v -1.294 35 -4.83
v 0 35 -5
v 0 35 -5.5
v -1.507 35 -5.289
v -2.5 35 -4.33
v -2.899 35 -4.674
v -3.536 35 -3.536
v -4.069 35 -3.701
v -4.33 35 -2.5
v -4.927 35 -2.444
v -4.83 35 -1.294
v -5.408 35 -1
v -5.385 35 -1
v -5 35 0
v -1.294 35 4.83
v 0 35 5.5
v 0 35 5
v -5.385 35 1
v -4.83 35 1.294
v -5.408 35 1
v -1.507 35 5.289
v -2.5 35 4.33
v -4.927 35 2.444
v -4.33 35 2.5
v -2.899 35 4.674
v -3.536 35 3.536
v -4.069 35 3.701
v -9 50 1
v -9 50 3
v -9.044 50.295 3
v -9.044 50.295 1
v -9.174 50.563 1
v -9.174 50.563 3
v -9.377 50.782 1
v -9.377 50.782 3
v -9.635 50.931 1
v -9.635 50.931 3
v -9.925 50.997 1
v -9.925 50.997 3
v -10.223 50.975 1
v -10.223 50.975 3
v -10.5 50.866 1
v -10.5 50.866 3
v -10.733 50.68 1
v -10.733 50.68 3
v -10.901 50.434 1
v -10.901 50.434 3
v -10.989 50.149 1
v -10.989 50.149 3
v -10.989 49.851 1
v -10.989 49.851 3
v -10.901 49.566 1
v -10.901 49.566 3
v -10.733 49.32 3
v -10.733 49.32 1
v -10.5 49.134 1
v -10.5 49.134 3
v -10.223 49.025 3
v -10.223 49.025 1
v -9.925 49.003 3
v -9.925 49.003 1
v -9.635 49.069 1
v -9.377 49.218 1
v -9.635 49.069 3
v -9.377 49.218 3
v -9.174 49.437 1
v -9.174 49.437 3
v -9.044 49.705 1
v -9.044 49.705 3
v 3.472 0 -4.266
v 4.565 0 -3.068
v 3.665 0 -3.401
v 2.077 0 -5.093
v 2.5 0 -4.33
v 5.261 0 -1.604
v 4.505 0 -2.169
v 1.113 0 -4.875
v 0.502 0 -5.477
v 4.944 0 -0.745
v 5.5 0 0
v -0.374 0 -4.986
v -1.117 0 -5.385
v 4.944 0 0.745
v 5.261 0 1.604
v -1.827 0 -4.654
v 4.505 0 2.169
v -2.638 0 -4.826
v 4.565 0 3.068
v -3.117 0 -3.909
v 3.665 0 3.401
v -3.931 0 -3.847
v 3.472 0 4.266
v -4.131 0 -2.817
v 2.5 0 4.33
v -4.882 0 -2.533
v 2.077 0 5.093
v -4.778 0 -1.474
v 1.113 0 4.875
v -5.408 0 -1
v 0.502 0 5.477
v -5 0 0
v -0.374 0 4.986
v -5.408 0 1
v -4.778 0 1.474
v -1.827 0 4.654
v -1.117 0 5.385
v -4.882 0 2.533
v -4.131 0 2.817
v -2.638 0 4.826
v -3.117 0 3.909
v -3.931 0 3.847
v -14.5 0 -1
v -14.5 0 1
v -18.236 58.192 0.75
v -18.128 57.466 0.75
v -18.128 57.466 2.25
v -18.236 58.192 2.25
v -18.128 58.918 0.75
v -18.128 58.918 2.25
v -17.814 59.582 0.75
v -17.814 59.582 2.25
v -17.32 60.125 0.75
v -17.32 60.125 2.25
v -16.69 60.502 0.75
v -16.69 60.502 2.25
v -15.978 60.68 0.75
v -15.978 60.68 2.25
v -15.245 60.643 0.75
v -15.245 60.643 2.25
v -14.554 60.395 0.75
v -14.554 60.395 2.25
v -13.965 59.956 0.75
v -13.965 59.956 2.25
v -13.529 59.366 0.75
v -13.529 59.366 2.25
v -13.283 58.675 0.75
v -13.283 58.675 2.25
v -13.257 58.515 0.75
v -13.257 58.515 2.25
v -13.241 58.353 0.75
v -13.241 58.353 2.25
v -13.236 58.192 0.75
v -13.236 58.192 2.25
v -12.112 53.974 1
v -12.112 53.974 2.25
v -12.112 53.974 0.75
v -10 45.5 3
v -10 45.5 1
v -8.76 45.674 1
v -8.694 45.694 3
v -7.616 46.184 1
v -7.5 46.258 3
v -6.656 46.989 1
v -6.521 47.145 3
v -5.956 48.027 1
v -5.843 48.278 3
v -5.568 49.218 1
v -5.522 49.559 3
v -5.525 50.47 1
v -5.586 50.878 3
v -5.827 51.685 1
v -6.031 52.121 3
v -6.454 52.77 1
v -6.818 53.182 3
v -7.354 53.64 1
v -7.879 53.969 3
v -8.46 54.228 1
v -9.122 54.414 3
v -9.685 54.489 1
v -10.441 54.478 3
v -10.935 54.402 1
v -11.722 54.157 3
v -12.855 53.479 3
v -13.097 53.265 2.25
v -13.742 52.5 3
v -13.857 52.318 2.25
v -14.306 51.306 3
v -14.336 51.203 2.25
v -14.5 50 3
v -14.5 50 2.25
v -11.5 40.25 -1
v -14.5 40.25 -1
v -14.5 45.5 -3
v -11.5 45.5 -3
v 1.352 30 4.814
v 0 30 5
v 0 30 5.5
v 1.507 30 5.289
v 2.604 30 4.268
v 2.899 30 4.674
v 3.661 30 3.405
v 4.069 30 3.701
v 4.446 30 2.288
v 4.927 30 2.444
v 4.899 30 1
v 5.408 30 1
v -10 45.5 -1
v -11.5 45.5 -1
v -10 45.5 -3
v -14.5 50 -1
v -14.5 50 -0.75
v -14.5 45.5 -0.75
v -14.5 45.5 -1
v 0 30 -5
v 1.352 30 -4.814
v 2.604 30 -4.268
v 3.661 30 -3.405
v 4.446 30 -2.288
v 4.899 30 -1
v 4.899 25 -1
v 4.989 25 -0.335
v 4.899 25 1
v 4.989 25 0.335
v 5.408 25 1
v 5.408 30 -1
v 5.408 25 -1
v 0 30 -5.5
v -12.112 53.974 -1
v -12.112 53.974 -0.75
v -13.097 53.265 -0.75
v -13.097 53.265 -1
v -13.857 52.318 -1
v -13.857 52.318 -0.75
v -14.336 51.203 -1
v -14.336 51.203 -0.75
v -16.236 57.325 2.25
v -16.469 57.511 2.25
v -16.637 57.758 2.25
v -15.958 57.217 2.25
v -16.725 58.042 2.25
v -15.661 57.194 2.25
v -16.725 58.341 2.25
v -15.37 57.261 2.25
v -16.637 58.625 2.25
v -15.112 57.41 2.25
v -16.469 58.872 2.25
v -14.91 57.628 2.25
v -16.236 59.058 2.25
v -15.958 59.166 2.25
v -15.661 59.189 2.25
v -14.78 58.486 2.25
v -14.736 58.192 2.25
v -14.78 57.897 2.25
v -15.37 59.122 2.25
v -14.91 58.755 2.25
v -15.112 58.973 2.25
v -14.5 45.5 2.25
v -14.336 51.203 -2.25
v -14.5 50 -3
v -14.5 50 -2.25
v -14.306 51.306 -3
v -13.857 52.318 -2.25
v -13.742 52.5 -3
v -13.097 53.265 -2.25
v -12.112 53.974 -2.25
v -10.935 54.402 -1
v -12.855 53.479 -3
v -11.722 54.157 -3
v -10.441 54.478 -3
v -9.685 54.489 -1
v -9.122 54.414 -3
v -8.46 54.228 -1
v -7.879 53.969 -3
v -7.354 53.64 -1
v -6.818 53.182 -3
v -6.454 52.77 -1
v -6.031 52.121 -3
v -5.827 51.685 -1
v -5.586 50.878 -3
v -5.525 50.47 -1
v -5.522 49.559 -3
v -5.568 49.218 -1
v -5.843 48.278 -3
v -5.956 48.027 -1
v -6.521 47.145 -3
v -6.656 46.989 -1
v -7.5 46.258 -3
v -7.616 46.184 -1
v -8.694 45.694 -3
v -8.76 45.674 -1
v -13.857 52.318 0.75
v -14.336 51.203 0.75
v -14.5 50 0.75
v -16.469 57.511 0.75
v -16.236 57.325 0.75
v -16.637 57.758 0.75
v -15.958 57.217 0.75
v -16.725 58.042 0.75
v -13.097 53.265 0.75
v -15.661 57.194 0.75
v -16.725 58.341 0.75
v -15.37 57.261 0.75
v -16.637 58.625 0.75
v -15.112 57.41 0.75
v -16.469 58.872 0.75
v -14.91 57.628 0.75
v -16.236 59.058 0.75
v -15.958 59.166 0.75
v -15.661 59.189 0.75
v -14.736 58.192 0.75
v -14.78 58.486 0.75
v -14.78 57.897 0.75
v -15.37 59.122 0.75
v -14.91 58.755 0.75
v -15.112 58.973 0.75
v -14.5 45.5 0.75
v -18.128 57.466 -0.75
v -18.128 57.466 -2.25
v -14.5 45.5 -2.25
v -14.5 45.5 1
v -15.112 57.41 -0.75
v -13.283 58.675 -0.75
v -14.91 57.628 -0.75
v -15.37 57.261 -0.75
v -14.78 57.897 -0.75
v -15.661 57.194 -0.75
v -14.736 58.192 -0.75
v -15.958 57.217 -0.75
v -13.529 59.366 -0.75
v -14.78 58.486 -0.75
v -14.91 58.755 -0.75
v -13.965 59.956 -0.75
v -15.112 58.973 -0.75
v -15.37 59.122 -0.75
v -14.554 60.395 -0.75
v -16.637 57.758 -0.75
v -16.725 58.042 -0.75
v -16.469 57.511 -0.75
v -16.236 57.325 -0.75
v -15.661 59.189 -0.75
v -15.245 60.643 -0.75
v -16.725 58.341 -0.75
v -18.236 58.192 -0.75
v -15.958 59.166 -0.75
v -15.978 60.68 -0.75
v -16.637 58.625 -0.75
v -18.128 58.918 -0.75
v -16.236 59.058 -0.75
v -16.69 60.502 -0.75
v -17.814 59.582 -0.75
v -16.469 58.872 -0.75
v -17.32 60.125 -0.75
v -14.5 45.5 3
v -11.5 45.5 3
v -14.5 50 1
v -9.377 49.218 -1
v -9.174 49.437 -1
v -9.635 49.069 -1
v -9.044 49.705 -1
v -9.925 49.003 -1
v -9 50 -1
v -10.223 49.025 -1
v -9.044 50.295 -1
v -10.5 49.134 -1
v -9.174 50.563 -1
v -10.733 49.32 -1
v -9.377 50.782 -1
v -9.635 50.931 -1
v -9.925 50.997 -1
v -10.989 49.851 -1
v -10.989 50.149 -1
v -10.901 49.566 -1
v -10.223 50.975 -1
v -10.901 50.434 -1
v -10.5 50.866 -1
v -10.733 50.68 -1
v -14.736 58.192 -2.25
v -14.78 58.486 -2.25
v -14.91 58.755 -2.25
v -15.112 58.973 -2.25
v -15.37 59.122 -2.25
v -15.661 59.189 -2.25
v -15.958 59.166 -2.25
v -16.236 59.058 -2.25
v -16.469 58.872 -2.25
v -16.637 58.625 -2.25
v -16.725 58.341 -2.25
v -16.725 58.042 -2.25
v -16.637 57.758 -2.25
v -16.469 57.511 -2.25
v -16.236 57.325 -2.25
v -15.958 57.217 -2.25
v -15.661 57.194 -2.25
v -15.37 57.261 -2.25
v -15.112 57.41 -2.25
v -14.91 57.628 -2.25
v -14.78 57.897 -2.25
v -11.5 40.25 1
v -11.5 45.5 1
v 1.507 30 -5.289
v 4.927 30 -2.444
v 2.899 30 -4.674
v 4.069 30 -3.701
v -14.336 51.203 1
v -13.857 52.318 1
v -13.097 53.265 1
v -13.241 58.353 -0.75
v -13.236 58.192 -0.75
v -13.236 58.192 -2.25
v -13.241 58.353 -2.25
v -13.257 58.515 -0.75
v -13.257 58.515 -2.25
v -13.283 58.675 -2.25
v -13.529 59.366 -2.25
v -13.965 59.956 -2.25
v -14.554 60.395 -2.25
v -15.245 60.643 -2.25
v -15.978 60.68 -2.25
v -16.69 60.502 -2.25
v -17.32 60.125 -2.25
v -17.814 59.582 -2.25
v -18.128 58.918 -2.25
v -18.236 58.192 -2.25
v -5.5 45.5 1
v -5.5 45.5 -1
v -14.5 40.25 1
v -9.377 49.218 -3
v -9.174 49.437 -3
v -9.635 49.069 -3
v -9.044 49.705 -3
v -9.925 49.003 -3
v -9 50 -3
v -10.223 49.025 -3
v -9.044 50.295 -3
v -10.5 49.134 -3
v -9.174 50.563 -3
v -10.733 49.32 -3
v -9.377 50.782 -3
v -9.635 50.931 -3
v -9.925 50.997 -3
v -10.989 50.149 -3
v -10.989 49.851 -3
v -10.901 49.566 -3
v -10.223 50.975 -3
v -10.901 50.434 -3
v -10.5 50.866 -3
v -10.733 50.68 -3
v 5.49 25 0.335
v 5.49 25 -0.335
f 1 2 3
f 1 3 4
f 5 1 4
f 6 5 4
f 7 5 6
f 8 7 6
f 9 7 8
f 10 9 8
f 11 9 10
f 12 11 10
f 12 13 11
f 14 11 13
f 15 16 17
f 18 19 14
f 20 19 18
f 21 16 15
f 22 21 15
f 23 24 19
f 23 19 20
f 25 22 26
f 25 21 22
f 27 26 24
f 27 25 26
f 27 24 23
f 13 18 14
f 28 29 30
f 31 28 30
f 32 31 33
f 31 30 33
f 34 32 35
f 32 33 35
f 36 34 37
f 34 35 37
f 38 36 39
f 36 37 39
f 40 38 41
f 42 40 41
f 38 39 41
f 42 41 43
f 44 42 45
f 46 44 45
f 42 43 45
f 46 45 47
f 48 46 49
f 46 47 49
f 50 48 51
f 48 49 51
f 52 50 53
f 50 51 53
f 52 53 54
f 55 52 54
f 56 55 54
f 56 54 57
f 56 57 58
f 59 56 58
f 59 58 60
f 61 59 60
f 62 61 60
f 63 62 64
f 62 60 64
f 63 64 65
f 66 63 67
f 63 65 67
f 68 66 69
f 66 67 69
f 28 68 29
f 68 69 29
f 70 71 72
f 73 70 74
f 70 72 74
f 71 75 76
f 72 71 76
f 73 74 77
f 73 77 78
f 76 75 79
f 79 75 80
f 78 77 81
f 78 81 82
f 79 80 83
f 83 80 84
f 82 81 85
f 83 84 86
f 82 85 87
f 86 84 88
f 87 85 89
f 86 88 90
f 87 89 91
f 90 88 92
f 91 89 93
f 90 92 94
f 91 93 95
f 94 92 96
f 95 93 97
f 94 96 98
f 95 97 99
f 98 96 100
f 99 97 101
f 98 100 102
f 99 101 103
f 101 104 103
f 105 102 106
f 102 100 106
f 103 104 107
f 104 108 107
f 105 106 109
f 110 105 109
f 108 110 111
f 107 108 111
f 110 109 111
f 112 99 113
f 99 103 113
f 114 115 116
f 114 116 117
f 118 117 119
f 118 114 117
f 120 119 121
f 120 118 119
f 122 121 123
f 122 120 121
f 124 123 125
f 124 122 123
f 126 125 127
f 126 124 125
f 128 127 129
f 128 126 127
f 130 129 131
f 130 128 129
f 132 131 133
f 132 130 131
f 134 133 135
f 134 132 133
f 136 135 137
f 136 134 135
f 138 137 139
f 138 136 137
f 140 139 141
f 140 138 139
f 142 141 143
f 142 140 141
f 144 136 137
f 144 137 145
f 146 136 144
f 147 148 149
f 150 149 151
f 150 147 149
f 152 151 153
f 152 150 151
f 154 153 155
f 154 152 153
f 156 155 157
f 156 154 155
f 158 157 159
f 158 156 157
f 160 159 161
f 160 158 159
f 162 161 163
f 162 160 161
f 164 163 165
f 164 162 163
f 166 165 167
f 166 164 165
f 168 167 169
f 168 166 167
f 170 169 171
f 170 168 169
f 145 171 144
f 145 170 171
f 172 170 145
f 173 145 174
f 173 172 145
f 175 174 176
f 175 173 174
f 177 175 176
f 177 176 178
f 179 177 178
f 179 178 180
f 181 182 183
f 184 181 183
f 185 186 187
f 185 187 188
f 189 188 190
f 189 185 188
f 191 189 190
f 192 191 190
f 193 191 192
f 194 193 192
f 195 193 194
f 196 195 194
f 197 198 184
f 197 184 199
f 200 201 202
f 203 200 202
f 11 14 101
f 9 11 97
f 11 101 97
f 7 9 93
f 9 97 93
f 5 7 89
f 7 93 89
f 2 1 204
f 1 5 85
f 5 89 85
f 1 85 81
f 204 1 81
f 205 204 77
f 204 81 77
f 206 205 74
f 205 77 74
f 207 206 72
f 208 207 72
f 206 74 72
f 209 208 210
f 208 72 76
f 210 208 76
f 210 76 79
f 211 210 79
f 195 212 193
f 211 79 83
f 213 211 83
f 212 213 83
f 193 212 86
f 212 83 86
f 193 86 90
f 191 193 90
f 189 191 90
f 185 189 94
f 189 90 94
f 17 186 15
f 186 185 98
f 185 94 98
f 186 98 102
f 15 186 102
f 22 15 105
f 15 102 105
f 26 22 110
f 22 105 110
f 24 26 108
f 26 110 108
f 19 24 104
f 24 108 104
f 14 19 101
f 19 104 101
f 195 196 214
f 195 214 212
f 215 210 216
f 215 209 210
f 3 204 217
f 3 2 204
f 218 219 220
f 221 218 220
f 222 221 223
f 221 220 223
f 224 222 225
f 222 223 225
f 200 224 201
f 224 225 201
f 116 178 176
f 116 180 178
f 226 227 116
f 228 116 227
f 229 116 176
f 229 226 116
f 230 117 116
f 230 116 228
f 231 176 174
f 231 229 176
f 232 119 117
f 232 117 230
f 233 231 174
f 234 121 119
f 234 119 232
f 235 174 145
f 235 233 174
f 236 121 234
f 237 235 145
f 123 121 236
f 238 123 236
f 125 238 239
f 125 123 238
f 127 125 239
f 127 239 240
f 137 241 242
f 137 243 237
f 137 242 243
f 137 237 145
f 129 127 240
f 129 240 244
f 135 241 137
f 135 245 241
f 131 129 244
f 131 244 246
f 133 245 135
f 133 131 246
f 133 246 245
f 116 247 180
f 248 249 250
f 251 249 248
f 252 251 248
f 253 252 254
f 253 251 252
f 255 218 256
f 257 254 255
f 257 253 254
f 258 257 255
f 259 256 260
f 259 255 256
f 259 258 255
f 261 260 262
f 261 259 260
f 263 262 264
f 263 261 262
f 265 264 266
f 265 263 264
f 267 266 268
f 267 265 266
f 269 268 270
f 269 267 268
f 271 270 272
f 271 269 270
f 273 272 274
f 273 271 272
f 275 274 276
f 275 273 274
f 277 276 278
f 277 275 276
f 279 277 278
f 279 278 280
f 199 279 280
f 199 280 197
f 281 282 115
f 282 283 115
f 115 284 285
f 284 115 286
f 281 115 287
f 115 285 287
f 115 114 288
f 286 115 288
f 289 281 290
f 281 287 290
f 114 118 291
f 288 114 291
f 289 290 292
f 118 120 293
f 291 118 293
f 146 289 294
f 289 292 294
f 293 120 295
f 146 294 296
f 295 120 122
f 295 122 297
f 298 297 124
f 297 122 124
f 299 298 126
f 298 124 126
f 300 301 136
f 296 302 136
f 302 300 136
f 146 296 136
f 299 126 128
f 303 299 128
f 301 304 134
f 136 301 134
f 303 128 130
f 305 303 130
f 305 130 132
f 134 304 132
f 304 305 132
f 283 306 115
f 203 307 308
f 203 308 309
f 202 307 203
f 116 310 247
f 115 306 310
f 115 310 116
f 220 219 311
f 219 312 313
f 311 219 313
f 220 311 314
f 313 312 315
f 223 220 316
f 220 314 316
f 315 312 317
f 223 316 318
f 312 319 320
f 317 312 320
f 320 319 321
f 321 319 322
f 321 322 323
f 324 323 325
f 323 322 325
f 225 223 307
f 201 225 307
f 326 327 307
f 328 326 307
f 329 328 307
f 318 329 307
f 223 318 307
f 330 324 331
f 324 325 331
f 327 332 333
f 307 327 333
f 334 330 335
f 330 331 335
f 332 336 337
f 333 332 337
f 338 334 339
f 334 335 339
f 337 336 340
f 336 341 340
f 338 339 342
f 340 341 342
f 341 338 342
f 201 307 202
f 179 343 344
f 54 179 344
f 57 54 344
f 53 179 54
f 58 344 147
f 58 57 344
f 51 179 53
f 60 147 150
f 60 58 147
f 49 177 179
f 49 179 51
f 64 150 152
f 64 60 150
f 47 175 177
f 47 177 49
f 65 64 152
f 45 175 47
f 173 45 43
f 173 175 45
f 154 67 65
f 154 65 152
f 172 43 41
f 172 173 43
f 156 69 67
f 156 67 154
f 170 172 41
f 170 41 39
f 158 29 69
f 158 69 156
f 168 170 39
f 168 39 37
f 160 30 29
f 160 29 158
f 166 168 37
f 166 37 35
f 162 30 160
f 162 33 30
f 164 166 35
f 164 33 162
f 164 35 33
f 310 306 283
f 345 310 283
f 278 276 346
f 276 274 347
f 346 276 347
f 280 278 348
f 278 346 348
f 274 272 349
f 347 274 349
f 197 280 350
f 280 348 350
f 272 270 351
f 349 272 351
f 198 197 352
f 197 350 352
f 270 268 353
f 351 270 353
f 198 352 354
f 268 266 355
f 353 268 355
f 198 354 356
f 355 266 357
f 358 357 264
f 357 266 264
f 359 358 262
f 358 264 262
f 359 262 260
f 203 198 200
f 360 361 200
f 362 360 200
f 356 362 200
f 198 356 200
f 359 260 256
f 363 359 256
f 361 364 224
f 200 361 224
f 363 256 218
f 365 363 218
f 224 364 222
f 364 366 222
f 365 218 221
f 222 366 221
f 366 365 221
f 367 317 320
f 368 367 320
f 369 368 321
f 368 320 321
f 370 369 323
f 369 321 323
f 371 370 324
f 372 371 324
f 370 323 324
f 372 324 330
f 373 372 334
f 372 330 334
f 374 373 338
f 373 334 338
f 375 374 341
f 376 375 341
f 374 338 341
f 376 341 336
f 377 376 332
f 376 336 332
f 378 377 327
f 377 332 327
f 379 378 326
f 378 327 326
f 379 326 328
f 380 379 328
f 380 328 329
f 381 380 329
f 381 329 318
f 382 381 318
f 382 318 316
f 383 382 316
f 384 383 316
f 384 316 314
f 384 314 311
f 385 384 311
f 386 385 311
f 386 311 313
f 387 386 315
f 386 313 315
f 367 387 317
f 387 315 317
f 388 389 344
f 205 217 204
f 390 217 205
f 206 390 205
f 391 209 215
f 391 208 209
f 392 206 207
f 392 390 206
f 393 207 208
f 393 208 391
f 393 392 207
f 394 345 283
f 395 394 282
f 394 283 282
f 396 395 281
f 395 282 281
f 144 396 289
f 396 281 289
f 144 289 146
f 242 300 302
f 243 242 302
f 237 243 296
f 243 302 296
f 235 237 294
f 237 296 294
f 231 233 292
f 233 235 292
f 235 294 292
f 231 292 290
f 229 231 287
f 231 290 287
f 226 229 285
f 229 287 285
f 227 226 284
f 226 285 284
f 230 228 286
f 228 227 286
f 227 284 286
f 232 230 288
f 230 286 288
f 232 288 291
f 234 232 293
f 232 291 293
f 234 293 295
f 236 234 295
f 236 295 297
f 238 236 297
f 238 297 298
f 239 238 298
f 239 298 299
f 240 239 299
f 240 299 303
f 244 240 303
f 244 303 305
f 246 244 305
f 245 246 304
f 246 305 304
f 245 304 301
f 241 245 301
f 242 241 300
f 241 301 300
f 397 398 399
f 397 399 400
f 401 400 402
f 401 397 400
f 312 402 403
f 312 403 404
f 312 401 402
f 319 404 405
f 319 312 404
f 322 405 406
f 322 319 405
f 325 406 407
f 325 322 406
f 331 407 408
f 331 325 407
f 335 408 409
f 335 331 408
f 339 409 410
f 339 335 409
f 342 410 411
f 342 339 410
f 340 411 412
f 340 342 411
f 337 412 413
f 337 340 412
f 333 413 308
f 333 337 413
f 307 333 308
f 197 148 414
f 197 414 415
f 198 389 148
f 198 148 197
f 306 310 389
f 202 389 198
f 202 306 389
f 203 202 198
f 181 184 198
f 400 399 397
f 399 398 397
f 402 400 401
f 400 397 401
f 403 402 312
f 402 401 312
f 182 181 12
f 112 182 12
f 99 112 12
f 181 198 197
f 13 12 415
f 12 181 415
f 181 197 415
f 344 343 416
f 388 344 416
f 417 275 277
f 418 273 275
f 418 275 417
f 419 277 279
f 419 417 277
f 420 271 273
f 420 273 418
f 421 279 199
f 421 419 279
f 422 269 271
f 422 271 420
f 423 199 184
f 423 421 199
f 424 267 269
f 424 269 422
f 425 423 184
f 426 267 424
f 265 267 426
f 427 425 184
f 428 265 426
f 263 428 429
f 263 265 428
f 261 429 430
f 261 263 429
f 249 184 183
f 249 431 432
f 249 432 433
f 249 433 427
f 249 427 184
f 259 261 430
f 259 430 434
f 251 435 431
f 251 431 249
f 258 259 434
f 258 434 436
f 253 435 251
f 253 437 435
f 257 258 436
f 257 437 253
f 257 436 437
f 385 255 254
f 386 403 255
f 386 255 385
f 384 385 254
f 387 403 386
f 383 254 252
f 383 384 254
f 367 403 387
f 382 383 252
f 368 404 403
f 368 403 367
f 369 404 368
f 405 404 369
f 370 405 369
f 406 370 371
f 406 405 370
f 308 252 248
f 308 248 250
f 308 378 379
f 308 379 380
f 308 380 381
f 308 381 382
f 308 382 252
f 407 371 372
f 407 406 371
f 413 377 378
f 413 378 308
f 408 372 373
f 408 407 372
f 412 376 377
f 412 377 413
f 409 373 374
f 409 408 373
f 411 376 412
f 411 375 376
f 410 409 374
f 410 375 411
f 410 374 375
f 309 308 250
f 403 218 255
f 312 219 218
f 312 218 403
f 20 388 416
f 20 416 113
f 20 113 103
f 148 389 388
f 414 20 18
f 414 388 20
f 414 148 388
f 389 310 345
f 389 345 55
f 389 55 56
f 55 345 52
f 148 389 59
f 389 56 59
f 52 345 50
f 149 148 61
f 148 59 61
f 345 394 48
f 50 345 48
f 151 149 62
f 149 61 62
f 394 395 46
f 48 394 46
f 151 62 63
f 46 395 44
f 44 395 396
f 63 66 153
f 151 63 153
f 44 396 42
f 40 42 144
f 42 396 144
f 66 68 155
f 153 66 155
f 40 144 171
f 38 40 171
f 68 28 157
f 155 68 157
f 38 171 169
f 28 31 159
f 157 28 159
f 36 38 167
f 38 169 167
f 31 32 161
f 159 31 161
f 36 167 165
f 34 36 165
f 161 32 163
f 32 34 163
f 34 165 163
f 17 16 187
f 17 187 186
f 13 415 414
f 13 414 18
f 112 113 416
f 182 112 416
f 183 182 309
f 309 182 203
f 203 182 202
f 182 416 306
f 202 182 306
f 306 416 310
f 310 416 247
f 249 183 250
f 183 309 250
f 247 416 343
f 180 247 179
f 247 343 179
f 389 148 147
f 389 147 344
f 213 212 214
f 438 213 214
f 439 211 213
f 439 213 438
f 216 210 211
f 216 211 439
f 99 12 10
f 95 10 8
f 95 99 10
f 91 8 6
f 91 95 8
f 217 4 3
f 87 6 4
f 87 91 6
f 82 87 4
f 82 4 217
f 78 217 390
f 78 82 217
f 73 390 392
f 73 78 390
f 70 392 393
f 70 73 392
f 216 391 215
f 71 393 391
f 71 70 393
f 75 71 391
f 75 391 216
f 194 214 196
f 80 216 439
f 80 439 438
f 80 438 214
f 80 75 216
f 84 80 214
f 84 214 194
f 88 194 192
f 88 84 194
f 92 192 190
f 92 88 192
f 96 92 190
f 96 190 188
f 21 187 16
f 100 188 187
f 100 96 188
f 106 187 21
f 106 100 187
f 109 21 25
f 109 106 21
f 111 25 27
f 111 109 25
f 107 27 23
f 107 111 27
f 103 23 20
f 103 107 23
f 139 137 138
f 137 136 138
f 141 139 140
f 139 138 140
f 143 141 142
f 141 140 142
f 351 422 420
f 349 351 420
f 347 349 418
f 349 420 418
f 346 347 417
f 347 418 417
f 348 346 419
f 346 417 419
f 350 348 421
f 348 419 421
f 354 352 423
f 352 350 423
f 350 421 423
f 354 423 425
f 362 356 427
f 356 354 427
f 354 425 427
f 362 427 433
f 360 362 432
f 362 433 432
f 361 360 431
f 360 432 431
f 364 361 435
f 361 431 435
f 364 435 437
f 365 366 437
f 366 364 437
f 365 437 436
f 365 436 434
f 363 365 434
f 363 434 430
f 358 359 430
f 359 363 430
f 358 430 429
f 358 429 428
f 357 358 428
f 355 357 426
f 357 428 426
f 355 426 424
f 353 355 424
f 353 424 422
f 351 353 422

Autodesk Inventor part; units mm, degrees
ref_plane "YZ Plane" through (0, 0, 0) normal (1, 0, 0) x (0, 1, 0)
ref_plane "XZ Plane" through (0, 0, 0) normal (0, 1, 0) x (-1, 0, 0)
sketch "Sketch1" plane through (0, 0, 0) normal (0, 1, 0) x (-1, 0, 0)
  circle A0 centre (0, 0) radius 5
  circle A1 centre (0, 0) radius 5.5
  dimension "d0" = 10
  dimension "d1" = 11
extrude "Extrusion1" add sketch "Sketch1" along normal blind 35
sketch "Sketch2" plane through (0, 0, 0) normal (0, 0, 1) x (1, 0, 0)
  point P0 (0, 0)
sketch "Sketch3" plane through (0, 0, 0) normal (0, 0, 1) x (1, 0, 0)
  line L0 (0, 0) -> (-10, 0)
  line L1 (-5.5, 0) -> (5.5, 0) projected
  circle A0 centre (-10, 50) radius 1
  line L2 (-5.5495, 50) -> (-5.5, 50)
  line L3 (-5.5, 50) -> (-5.5, 35)
  line L4 (5.5, 35) -> (-5.5, 35) projected
  line L5 (-14.5, 50) -> (-14.5, 0)
  line L6 (-14.5, 0) -> (-10, 0)
  circle A1 centre (-10, 50) radius 4.5
  line L7 (-10, 45.5) -> (-5.5, 45.5)
  line L8 (-14.5, 45.5) -> (-10, 45.5)
  line L9 (-5.5, 0) -> (-5.5, 50)
  line L10 (-5.5, 0) -> (-5.5, 45.5)
  line L11 (5, 0) -> (-5, 0) projected
  line L12 (-5.5, 0) -> (-5.5, 45.5)
  line L13 (-10, 0) -> (-5, 0)
  line L14 (-5.5, 45.5) -> (-5, 0)
  line L15 (-10, 0) -> (-10, 45.5)
  line L16 (-10, 45.5) -> (-5.5, 45.5)
  line L17 (-9, 50) -> (-10, 50)
  line L18 (-11, 50) -> (-14.5, 50)
  line L19 (-10, 0) -> (-10, 45.5)
  line L20 (-10, 49) -> (-10, 50)
  circle A2 centre (-10, 50) radius 4.5
  line L21 (-14.5, 45.5) -> (-14.5, 50)
  line L22 (-14.5, 45.5) -> (-5.5, 45.5)
  line L23 (-5.5, 45.5) -> (-5.5, 50)
  line L24 (-10, 50) -> (0, 50) construction
  line L25 (-10, 50) -> (-10.5736, 50.8192)
  circle A3 centre (-15.7358, 58.1915) radius 1
  circle A4 centre (-15.7358, 58.1915) radius 2.5
  point P0 (12.8857, 32.907)
  dimension "d4" = 10
  dimension "d5" = 50
  dimension "d7" = 2
  dimension "d8" = 9
  dimension "d19" = 2
  dimension "d20" = 5
extrude "Extrusion2" add sketch "Sketch3" along normal mid plane 2 contours L0 L9 L4 L14 | L0 L15 L7 L3 L9 | L4 L3 L14 | L6 L5 L8 L15
sketch "Sketch4" plane through (0, 0, 1) normal (0, 0, 1) x (1, 0, 0)
  circle A0 centre (-10, 50) radius 4.5 projected
  line L0 (-14.5, 50) -> (-14.5, 0) projected
  line L1 (-5.5, 50) -> (-5.5, 35) projected
  line L2 (-5.5, 45.5) -> (-14.5, 45.5) projected
  arc A1 (-14.5, 50) -> (-10, 45.5) centre (-10, 50) ccw
  line L3 (-10, 45.5) -> (-14.5, 45.5)
  line L4 (-14.5, 45.5) -> (-14.5, 50)
  point P0 (0, 0)
extrude "Extrusion3" add sketch "Sketch4" along normal blind 2 contours A0 L2 L0
sketch "Sketch5" plane through (0, 0, 1) normal (0, 0, 1) x (1, 0, 0)
  line L0 (-5.3846, 35) -> (-5.5, 45.5) projected
  line L1 (-5.4396, 40) -> (-14.5, 40)
  line L2 (-14.5, 45.5) -> (-14.5, 0) projected
  point P0 (0, 0)
sketch "Sketch6" plane through (-14.5, 45.5, 1) normal (-1, 0, 0) x (0, 0, 1)
  line L0 (2, 0) -> (0, -5.25)
  line L1 (0, -10.5) -> (0, 0) projected
  line L2 (2, 0) -> (0, 0)
  line L3 (0, 0) -> (0, -5.25)
  point P0 (-1, -45.5)
extrude "Extrusion4" add sketch "Sketch6" against normal blind 3
sketch "Sketch7" plane through (0, 0, 3) normal (0, 0, 1) x (1, 0, 0)
  circle A0 centre (-10, 50) radius 4.5 projected
  circle A1 centre (-10, 50) radius 1 projected
  point P0 (0, 0)
extrude "Extrusion5" add sketch "Sketch7" against normal blind 2
mirror "Mirror1" about plane through (0, 0, 0) normal (0, 0, 1) of "Extrusion4", "Extrusion3", "Extrusion5"
ref_plane "Work Plane1" through (0, 0, 0.75) normal (0, 0, 1) x (1, 0, 0)
sketch "Sketch8" plane through (0, 0, 0.75) normal (0, 0, 1) x (1, 0, 0)
  circle A0 centre (-15.7358, 58.1915) radius 2.5 projected
  circle A1 centre (-15.7358, 58.1915) radius 1 projected
  line L0 (-14.5, 45.5) -> (-18.1282, 57.4661)
  line L1 (-13.3433, 58.9169) -> (-12.1116, 53.9738)
  arc A2 (-10, 45.5) -> (-14.5, 50) centre (-10, 50) ccw projected
  arc A3 (-12.1116, 53.9738) -> (-14.5, 50) centre (-10, 50) ccw
  line L2 (-14.5, 45.5) -> (-14.5, 50)
  line L3 (-14.5, 50) -> (-14.5, 45.5) projected
  point P0 (0, 0)
extrude "Extrusion6" add sketch "Sketch8" along normal blind 1.5
mirror "Mirror2" about plane through (0, 0, 0) normal (0, 0, 1) of "Extrusion6"
sketch "Sketch9" plane through (0, 0, 0) normal (0, 0, -1) x (1, 0, 0)
  point P0 (0, 0)
sketch "Sketch10" plane through (0, 35, 0) normal (0, 1, 0) x (1, 0, 0)
  line L0 (6.5, -1) -> (4.5, -1)
  line L1 (4.5, -1) -> (4.5, 1)
  line L2 (4.5, 1) -> (6.5, 1)
  line L3 (6.5, 1) -> (6.5, -1)
  arc A0 (-5.4083, -1) -> (-5.4083, 1) centre (0, 0) ccw projected
  line L4 (6.5, -1) -> (4.5, 1) construction
  line L5 (4.5, -1) -> (6.5, 1) construction
  point P0 (5.5, 0)
  dimension "d24" = 2
  dimension "d25" = 2
extrude "Extrusion7" cut sketch "Sketch10" against normal blind 10
sketch "Sketch11" plane through (0, 35, 0) normal (0, 1, 0) x (1, 0, 0)
  line L0 (0, 5.5536) -> (9.1038, 5.5536)
  line L1 (9.1038, 5.5536) -> (9.1038, -5.5536)
  line L2 (9.1038, -5.5536) -> (0, -5.5536)
  line L3 (0, -5.5536) -> (0, 5.5536)
  point P0 (0, 0)
extrude "Extrusion8" cut sketch "Sketch11" against normal blind 5
ref_plane "Work Plane2" through (0, 0, 0) normal (0, 0, 1) x (1, 0, 0)
properties part number "Base_Cylinder_1"
